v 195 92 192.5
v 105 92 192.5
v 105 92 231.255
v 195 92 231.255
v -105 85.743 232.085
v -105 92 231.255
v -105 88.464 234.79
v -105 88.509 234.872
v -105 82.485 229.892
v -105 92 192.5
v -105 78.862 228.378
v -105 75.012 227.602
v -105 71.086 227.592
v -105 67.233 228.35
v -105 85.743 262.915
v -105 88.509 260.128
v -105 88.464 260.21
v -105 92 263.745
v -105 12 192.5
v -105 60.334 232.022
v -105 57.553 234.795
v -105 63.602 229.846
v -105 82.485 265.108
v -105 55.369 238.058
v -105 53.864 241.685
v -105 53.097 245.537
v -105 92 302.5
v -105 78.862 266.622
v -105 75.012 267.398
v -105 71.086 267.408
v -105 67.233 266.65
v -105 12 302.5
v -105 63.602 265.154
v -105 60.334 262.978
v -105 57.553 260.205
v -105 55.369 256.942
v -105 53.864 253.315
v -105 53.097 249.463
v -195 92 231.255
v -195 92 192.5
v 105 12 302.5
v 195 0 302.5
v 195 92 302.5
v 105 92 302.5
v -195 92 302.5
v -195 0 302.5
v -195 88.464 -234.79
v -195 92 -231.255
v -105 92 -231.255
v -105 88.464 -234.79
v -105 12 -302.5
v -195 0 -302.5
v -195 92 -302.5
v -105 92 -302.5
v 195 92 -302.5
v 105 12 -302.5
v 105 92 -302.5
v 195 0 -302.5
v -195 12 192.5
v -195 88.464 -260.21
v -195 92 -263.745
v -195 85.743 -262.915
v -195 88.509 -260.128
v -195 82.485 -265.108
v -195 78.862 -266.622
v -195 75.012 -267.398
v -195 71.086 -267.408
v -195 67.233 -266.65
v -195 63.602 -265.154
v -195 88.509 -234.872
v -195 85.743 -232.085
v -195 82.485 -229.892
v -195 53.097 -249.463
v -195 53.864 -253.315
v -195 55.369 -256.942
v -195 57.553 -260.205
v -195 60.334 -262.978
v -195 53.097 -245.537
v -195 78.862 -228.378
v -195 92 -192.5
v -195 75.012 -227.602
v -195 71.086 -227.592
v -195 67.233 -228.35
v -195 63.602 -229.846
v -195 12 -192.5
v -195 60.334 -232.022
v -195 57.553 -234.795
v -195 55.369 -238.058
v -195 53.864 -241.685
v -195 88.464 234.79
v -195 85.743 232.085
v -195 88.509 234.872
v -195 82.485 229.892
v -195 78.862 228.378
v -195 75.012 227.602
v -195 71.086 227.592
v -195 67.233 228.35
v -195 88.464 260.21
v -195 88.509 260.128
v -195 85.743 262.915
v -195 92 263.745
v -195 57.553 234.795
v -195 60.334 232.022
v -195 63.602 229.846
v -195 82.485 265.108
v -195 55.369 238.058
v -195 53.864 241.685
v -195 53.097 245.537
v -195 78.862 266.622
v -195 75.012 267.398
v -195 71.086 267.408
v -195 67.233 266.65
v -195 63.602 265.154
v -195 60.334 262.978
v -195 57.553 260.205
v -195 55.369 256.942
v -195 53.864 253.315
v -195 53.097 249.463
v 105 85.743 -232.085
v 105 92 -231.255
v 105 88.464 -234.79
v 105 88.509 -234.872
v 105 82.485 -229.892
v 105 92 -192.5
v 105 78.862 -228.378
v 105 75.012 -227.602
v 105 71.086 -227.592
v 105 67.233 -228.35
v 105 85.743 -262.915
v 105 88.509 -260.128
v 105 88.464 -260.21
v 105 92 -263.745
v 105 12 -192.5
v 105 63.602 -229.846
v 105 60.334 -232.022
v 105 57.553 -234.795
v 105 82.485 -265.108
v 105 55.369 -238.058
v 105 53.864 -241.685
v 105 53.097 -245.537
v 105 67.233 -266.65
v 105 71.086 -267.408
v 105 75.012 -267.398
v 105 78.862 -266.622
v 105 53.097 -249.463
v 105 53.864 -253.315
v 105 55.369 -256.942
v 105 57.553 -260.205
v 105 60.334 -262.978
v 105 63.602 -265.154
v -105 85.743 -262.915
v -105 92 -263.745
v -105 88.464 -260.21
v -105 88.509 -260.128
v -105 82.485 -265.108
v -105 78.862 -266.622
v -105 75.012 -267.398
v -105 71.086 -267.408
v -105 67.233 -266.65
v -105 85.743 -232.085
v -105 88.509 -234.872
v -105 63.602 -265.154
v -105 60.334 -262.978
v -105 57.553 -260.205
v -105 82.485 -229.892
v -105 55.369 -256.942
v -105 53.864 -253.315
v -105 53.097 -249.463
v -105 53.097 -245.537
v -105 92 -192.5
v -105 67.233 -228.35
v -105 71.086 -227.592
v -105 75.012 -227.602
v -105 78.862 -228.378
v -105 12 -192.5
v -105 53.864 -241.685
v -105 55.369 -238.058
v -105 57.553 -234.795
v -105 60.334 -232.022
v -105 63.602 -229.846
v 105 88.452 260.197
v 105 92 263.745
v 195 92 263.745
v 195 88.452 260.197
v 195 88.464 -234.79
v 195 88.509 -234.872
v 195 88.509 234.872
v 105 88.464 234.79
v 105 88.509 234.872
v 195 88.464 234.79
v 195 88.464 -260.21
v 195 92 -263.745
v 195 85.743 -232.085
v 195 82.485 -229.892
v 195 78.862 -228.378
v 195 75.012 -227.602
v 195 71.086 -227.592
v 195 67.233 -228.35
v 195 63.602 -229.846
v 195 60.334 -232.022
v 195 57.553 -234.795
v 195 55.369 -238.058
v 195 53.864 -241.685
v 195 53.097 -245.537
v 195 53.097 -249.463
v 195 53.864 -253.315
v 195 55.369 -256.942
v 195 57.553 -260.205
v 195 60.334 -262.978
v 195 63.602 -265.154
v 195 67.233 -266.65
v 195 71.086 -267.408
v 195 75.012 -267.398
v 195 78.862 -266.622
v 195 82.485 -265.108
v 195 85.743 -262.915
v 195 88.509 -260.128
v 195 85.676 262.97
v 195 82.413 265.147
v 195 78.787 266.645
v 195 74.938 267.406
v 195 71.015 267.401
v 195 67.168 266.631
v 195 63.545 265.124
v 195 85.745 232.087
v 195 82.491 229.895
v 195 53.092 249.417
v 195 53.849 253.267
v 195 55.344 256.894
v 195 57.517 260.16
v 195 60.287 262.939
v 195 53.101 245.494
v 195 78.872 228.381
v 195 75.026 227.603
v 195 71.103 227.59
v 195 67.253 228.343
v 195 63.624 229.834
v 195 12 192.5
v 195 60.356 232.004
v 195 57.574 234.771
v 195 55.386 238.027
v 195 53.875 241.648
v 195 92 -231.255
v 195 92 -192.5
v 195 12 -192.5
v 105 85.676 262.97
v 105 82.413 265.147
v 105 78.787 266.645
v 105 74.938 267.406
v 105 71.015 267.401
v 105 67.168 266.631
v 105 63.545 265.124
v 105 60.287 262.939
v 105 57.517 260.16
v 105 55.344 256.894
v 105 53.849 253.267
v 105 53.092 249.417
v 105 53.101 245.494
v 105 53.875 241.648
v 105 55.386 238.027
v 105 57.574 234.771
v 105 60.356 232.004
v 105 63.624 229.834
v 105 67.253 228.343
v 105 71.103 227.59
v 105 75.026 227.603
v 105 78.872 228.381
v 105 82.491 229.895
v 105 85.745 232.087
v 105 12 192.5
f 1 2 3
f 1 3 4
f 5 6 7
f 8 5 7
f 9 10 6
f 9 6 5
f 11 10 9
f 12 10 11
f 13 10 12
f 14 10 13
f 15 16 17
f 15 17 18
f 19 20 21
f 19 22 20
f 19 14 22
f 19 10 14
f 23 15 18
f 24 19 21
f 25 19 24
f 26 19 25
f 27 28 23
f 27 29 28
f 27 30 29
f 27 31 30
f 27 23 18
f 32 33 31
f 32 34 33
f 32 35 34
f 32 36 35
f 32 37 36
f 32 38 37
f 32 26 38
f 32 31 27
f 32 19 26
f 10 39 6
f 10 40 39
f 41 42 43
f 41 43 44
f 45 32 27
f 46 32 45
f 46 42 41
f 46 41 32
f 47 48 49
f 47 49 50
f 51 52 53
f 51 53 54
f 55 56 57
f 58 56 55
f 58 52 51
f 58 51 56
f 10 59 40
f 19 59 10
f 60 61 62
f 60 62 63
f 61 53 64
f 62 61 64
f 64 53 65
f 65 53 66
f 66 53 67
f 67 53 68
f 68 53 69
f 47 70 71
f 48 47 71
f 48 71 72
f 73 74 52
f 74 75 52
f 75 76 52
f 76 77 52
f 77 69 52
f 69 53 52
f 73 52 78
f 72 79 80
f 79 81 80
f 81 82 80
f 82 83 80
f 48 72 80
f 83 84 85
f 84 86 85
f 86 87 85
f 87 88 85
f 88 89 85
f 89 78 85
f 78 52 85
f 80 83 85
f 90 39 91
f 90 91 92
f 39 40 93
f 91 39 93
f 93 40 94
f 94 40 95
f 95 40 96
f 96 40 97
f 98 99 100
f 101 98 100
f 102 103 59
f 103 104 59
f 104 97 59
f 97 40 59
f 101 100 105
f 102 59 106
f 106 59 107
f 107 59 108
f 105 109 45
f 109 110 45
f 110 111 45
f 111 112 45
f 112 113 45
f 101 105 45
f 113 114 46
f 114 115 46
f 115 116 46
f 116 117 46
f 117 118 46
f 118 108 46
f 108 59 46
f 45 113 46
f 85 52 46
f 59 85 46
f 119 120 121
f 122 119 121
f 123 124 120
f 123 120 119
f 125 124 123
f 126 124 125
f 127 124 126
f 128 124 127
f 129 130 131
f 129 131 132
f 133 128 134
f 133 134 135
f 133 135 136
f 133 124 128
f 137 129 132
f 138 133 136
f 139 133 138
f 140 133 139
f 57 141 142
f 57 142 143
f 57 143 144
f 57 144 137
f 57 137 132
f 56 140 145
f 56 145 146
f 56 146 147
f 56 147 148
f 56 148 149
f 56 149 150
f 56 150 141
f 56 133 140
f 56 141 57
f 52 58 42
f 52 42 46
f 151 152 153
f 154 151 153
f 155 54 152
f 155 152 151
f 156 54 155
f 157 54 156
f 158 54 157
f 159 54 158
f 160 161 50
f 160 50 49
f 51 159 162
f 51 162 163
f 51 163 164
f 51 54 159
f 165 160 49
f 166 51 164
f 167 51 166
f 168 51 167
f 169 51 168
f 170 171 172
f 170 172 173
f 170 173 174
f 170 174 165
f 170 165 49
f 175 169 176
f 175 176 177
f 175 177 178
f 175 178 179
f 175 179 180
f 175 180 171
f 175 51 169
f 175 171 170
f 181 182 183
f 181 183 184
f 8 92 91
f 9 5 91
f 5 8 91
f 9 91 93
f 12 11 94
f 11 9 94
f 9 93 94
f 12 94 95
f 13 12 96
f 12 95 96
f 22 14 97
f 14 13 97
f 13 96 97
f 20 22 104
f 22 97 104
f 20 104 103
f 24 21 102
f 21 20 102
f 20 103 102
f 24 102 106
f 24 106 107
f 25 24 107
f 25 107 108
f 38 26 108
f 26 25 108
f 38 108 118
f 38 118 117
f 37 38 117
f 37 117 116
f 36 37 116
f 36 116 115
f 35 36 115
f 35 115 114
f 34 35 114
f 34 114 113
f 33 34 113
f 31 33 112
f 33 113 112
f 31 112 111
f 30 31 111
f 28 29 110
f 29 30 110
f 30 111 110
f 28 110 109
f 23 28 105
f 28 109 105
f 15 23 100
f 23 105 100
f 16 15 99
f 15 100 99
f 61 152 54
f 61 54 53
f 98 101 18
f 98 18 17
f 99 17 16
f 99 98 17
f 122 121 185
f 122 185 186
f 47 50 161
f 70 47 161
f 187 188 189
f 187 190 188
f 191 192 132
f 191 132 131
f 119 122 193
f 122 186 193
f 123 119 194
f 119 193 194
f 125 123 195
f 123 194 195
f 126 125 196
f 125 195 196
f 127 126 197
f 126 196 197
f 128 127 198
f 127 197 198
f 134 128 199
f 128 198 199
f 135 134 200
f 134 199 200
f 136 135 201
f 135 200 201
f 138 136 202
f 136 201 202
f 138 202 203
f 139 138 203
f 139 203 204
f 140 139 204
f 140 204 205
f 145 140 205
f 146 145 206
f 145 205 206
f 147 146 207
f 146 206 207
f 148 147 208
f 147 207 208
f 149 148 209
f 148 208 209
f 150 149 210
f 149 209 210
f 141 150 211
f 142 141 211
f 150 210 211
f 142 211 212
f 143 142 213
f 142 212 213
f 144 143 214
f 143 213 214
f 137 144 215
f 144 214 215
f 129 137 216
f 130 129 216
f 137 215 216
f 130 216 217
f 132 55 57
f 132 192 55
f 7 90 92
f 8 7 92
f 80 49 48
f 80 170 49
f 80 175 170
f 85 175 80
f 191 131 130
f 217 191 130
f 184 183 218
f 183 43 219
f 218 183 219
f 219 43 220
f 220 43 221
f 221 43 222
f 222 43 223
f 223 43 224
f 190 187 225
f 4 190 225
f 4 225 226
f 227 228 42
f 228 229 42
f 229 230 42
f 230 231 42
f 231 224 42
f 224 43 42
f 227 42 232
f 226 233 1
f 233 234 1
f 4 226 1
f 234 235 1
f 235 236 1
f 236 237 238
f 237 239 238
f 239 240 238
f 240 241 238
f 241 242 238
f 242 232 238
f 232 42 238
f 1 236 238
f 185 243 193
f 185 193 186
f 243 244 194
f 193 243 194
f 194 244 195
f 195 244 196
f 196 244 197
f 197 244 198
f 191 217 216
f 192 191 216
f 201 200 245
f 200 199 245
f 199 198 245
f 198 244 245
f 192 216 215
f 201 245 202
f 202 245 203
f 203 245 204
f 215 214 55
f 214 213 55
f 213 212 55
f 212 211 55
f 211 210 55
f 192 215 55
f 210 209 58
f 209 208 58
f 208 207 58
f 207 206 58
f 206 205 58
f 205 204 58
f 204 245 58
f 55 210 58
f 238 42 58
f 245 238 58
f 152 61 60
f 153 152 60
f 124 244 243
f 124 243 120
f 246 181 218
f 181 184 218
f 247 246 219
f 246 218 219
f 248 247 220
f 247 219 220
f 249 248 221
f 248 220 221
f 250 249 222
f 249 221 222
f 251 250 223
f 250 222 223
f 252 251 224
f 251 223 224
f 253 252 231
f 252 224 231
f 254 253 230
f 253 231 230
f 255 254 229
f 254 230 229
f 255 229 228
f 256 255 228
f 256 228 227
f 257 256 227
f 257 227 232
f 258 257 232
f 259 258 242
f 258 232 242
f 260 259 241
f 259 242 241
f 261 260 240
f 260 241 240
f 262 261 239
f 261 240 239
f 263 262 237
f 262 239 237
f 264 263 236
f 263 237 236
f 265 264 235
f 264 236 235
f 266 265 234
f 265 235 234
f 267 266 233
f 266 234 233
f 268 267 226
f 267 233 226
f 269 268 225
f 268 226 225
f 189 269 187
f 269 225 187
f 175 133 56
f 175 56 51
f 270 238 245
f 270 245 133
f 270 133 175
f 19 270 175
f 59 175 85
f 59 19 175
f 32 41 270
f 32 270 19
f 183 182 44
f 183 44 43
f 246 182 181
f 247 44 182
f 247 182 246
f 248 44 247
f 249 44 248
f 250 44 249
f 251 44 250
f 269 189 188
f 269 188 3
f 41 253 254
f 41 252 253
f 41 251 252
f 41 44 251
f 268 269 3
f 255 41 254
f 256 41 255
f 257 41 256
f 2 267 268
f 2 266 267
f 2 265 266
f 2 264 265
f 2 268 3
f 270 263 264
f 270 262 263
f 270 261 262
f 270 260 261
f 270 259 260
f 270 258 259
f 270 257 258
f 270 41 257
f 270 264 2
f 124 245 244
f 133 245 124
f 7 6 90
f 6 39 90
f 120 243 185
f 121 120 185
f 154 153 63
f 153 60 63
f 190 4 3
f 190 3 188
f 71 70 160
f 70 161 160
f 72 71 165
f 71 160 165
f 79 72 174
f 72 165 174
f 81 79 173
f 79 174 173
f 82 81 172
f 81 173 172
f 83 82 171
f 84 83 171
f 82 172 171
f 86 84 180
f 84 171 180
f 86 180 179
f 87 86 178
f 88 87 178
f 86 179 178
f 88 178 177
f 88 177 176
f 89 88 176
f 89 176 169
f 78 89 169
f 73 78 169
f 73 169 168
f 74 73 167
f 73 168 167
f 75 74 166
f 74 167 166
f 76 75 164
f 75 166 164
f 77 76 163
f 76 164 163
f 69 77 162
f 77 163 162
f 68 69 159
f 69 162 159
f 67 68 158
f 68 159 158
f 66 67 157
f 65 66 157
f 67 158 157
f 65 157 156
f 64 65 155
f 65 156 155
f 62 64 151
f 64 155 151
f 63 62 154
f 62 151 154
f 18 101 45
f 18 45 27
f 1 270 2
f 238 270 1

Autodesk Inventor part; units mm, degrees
ref_plane "YZ Plane" through (0, 0, 0) normal (1, 0, 0) x (0, 1, 0)
ref_plane "XZ Plane" through (0, 0, 0) normal (0, 1, 0) x (-1, 0, 0)
ref_plane "XY Plane" through (0, 0, 0) normal (0, 0, 1) x (1, 0, 0)
sketch "Sketch1" plane through (0, 0, 0) normal (0, 1, 0) x (-1, 0, 0)
  line L0 (195, 302.5) -> (-195, 302.5)
  line L1 (-195, 302.5) -> (-195, -302.5)
  line L2 (-195, -302.5) -> (195, -302.5)
  line L3 (195, -302.5) -> (195, 302.5)
  line L4 (195, 302.5) -> (-195, -302.5) construction
  line L5 (-195, 302.5) -> (195, -302.5) construction
  point P0 (0, 0)
  dimension "d0" = 390
  dimension "d1" = 605
extrude "Extrusion1" add sketch "Sketch1" along normal blind 12
sketch "Sketch2" plane through (0, 12, 0) normal (0, 1, 0) x (1, 0, 0)
  line L0 (-195, 302.5) -> (-195, -302.5) projected
  line L1 (-195, -302.5) -> (-195, -192.5)
  line L2 (-195, -302.5) -> (-85, -302.5) construction
  line L3 (-195, -192.5) -> (-105, -192.5)
  line L4 (-105, -192.5) -> (-105, -302.5)
  line L5 (-105, -302.5) -> (-195, -302.5)
  point P0 (0, 0)
  dimension "d4" = 110
  dimension "d5" = 90
  dimension "d6" = 90
  dimension "d7" = 90
extrude "Extrusion2" add sketch "Sketch2" along normal blind 80
sketch "Sketch3" plane through (-195, 0, -302.5) normal (-1, 0, 0) x (0, 0, 1)
  line L0 (495, 92) -> (605, 92) projected
  line L1 (495, 92) -> (550, 92)
  line L2 (550, 92) -> (550, 73)
  line L3 (550, 92) -> (569, 92) construction
  circle A0 centre (550, 73) radius 20
  point P0 (302.5, 0)
  point P1 (543.755, 92)
  point P2 (556.245, 92)
  dimension "d10" = 55
  dimension "d11" = 19
  dimension "d12" = 90
  dimension "d13" = 40
extrude "Extrusion3" cut sketch "Sketch3" against normal blind 110 contours L0 A0 picked at (549.7853, 66.101)
sketch "Sketch4" plane through (-195, 0, -302.5) normal (-1, 0, 0) x (0, 0, 1)
  line L0 (495, 92) -> (543.755, 92) projected
  line L1 (543.755, 92) -> (533.755, 92)
  line L2 (533.755, 92) -> (537.2905, 88.4645)
  arc A0 (543.755, 92) -> (556.245, 92) centre (550, 73) ccw projected
  line L3 (537.2905, 88.4645) -> (543.755, 92)
  point P0 (302.5, 0)
  dimension "d16" = 10
  dimension "d17" = 5
  dimension "d18" = 45
extrude "Extrusion4" cut sketch "Sketch4" against normal blind 110
sketch "Sketch5" plane through (-195, 0, -302.5) normal (-1, 0, 0) x (0, 0, 1)
  arc A0 (537.3715, 88.5088) -> (556.245, 92) centre (550, 73) ccw projected
  line L0 (556.245, 92) -> (566.245, 92)
  line L1 (556.245, 92) -> (605, 92) projected
  line L2 (556.245, 92) -> (566.245, 92) construction
  line L3 (566.245, 92) -> (562.7095, 88.4645)
  line L4 (562.7095, 88.4645) -> (556.245, 92)
  point P0 (302.5, 0)
  dimension "d21" = 10
  dimension "d22" = 0
  dimension "d23" = 5
  dimension "d24" = 45
extrude "Extrusion5" cut sketch "Sketch5" against normal blind 110
mirror "Mirror1" about plane through (0, 0, 0) normal (0, 0, 1) of "Extrusion2"
sketch "Sketch6" plane through (-105, 12, -302.5) normal (1, 0, 0) x (0, 0, -1)
  line L0 (-110, 80) -> (-55, 80)
  line L1 (0, 80) -> (-110, 80) projected
  line L2 (-55, 80) -> (-55, 61)
  circle A0 centre (-55, 61) radius 20
  point P0 (-302.5, -12)
  point P1 (-61.245, 80)
  point P2 (-48.755, 80)
  dimension "d27" = 55
  dimension "d28" = 19
  dimension "d29" = 40
extrude "Extrusion6" cut sketch "Sketch6" against normal blind 110 contours L0 L1 A0 picked at (-55.2147, 54.101)
mirror "Mirror2" about plane through (0, 0, 0) normal (1, 0, 0) of "Extrusion2", "Mirror1"
sketch "Sketch7" plane through (195, 0, 302.5) normal (1, 0, 0) x (0, 0, -1)
  arc A0 (543.755, 92) -> (556.245, 92) centre (550, 73) ccw projected
  circle A1 centre (550, 73) radius 20
  point P0 (302.5, 0)
extrude "Extrusion7" cut sketch "Sketch7" against normal blind 110
sketch "Sketch8" plane through (195, 0, 302.5) normal (1, 0, 0) x (0, 0, -1)
  arc A0 (42.3715, 88.5088) -> (67.6285, 88.5088) centre (55, 73) ccw projected
  circle A1 centre (55, 73) radius 20
  point P0 (302.5, 0)
  point P1 (67.6285, 88.5088)
extrude "Extrusion8" cut sketch "Sketch8" against normal blind 110
sketch "Sketch9" plane through (195, 0, 302.5) normal (1, 0, 0) x (0, 0, -1)
  line L0 (48.755, 92) -> (38.755, 92)
  line L1 (48.755, 92) -> (0, 92) projected
  line L2 (38.755, 92) -> (42.3026, 88.4524)
  arc A0 (48.755, 92) -> (61.245, 92) centre (55, 73) ccw projected
  line L3 (42.3026, 88.4524) -> (48.755, 92)
  point P0 (302.5, 0)
  dimension "d36" = 10
  dimension "d37" = 45
extrude "Extrusion9" cut sketch "Sketch9" against normal blind 110
sketch "Sketch10" plane through (195, 0, 302.5) normal (1, 0, 0) x (0, 0, -1)
  arc A0 (42.3026, 88.4524) -> (61.245, 92) centre (55, 73) ccw projected
  line L0 (61.245, 92) -> (71.245, 92)
  line L1 (110, 92) -> (61.245, 92) projected
  line L2 (71.245, 92) -> (67.7095, 88.4645)
  line L3 (67.7095, 88.4645) -> (61.245, 92)
  point P0 (302.5, 0)
  dimension "d40" = 10
  dimension "d41" = 5
  dimension "d42" = 45
extrude "Extrusion10" cut sketch "Sketch10" against normal blind 110
sketch "Sketch11" plane through (195, 0, 302.5) normal (1, 0, 0) x (0, 0, -1)
  line L0 (543.755, 92) -> (495, 92) projected
  line L1 (543.755, 92) -> (533.755, 92)
  line L2 (533.755, 92) -> (537.2905, 88.4645)
  arc A0 (543.755, 92) -> (556.245, 92) centre (550, 73) ccw projected
  line L3 (537.2905, 88.4645) -> (543.755, 92)
  point P0 (302.5, 0)
  dimension "d45" = 10
  dimension "d46" = 5
  dimension "d47" = 45
extrude "Extrusion11" cut sketch "Sketch11" against normal blind 110
sketch "Sketch12" plane through (195, 0, 302.5) normal (1, 0, 0) x (0, 0, -1)
  line L0 (556.245, 92) -> (566.245, 92)
  line L1 (605, 92) -> (556.245, 92) projected
  line L2 (566.245, 92) -> (562.7095, 88.4645)
  arc A0 (537.3715, 88.5088) -> (556.245, 92) centre (550, 73) ccw projected
  line L3 (562.7095, 88.4645) -> (556.245, 92)
  point P0 (302.5, 0)
  dimension "d50" = 10
  dimension "d51" = 5
  dimension "d52" = 45
extrude "Extrusion12" cut sketch "Sketch12" against normal blind 110
sketch "Sketch13" plane through (-195, 0, -302.5) normal (-1, 0, 0) x (0, 0, 1)
  line L0 (0, 92) -> (48.755, 92) projected
  line L1 (48.755, 92) -> (38.755, 92)
  line L2 (38.755, 92) -> (42.2905, 88.4645)
  line L3 (42.2905, 88.4645) -> (48.755, 92)
  line L4 (61.245, 92) -> (110, 92) projected
  line L5 (61.245, 92) -> (71.245, 92)
  line L6 (71.245, 92) -> (67.7095, 88.4645)
  arc A0 (48.755, 92) -> (61.245, 92) centre (55, 73) ccw projected
  line L7 (67.7095, 88.4645) -> (61.245, 92)
  point P0 (302.5, 0)
  dimension "d55" = 10
  dimension "d56" = 5
  dimension "d57" = 45
  dimension "d58" = 10
  dimension "d59" = 5
  dimension "d60" = 45
extrude "Extrusion13" cut sketch "Sketch13" against normal blind 110
properties part number "Kuka_base"
